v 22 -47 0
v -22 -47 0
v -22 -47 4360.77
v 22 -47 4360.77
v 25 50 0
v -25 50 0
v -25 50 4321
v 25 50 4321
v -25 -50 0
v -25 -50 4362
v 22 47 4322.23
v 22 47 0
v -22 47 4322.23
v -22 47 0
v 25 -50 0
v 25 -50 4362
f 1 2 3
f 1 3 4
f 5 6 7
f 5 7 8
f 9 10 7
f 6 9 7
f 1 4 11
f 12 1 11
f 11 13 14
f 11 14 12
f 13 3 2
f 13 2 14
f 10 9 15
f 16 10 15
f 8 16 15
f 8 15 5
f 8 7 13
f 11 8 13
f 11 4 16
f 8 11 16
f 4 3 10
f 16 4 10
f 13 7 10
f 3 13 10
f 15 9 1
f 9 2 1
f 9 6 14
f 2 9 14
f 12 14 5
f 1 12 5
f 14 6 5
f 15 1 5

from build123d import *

# Parameters (mm, degrees)
F0_W        = 50
F0_H        = 100
F0_W_2      = 44
F0_H_2      = 94
F1_DEPTH    = 4362
F2_T1_DEPTH = 568.5605442995


# Not quite as in the source:
# - a fillet or chamfer that OpenCascade refuses, or shapes differently, is made with other operations: its cross-section is extruded or revolved along the edge and cut away or added


with BuildPart() as f1:
    # F0 (on Top) → F1 (new body)
    with BuildSketch(Plane.XY):
        Rectangle(F0_W, F0_H)
        Rectangle(F0_W_2, F0_H_2, mode=Mode.SUBTRACT)
    extrude(amount=F1_DEPTH)

    # F2: chamfer of 100 x 41 on 1 edges, made by hand

    # F2_s2 → F2_t1 (cut)
    with BuildSketch(Plane.YZ.offset(-284.2802721497)):
        Polygon((50, 4321), (-50, 4362), (50, 4362), align=None)
    extrude(amount=F2_T1_DEPTH, mode=Mode.SUBTRACT)


solid = f1.part
